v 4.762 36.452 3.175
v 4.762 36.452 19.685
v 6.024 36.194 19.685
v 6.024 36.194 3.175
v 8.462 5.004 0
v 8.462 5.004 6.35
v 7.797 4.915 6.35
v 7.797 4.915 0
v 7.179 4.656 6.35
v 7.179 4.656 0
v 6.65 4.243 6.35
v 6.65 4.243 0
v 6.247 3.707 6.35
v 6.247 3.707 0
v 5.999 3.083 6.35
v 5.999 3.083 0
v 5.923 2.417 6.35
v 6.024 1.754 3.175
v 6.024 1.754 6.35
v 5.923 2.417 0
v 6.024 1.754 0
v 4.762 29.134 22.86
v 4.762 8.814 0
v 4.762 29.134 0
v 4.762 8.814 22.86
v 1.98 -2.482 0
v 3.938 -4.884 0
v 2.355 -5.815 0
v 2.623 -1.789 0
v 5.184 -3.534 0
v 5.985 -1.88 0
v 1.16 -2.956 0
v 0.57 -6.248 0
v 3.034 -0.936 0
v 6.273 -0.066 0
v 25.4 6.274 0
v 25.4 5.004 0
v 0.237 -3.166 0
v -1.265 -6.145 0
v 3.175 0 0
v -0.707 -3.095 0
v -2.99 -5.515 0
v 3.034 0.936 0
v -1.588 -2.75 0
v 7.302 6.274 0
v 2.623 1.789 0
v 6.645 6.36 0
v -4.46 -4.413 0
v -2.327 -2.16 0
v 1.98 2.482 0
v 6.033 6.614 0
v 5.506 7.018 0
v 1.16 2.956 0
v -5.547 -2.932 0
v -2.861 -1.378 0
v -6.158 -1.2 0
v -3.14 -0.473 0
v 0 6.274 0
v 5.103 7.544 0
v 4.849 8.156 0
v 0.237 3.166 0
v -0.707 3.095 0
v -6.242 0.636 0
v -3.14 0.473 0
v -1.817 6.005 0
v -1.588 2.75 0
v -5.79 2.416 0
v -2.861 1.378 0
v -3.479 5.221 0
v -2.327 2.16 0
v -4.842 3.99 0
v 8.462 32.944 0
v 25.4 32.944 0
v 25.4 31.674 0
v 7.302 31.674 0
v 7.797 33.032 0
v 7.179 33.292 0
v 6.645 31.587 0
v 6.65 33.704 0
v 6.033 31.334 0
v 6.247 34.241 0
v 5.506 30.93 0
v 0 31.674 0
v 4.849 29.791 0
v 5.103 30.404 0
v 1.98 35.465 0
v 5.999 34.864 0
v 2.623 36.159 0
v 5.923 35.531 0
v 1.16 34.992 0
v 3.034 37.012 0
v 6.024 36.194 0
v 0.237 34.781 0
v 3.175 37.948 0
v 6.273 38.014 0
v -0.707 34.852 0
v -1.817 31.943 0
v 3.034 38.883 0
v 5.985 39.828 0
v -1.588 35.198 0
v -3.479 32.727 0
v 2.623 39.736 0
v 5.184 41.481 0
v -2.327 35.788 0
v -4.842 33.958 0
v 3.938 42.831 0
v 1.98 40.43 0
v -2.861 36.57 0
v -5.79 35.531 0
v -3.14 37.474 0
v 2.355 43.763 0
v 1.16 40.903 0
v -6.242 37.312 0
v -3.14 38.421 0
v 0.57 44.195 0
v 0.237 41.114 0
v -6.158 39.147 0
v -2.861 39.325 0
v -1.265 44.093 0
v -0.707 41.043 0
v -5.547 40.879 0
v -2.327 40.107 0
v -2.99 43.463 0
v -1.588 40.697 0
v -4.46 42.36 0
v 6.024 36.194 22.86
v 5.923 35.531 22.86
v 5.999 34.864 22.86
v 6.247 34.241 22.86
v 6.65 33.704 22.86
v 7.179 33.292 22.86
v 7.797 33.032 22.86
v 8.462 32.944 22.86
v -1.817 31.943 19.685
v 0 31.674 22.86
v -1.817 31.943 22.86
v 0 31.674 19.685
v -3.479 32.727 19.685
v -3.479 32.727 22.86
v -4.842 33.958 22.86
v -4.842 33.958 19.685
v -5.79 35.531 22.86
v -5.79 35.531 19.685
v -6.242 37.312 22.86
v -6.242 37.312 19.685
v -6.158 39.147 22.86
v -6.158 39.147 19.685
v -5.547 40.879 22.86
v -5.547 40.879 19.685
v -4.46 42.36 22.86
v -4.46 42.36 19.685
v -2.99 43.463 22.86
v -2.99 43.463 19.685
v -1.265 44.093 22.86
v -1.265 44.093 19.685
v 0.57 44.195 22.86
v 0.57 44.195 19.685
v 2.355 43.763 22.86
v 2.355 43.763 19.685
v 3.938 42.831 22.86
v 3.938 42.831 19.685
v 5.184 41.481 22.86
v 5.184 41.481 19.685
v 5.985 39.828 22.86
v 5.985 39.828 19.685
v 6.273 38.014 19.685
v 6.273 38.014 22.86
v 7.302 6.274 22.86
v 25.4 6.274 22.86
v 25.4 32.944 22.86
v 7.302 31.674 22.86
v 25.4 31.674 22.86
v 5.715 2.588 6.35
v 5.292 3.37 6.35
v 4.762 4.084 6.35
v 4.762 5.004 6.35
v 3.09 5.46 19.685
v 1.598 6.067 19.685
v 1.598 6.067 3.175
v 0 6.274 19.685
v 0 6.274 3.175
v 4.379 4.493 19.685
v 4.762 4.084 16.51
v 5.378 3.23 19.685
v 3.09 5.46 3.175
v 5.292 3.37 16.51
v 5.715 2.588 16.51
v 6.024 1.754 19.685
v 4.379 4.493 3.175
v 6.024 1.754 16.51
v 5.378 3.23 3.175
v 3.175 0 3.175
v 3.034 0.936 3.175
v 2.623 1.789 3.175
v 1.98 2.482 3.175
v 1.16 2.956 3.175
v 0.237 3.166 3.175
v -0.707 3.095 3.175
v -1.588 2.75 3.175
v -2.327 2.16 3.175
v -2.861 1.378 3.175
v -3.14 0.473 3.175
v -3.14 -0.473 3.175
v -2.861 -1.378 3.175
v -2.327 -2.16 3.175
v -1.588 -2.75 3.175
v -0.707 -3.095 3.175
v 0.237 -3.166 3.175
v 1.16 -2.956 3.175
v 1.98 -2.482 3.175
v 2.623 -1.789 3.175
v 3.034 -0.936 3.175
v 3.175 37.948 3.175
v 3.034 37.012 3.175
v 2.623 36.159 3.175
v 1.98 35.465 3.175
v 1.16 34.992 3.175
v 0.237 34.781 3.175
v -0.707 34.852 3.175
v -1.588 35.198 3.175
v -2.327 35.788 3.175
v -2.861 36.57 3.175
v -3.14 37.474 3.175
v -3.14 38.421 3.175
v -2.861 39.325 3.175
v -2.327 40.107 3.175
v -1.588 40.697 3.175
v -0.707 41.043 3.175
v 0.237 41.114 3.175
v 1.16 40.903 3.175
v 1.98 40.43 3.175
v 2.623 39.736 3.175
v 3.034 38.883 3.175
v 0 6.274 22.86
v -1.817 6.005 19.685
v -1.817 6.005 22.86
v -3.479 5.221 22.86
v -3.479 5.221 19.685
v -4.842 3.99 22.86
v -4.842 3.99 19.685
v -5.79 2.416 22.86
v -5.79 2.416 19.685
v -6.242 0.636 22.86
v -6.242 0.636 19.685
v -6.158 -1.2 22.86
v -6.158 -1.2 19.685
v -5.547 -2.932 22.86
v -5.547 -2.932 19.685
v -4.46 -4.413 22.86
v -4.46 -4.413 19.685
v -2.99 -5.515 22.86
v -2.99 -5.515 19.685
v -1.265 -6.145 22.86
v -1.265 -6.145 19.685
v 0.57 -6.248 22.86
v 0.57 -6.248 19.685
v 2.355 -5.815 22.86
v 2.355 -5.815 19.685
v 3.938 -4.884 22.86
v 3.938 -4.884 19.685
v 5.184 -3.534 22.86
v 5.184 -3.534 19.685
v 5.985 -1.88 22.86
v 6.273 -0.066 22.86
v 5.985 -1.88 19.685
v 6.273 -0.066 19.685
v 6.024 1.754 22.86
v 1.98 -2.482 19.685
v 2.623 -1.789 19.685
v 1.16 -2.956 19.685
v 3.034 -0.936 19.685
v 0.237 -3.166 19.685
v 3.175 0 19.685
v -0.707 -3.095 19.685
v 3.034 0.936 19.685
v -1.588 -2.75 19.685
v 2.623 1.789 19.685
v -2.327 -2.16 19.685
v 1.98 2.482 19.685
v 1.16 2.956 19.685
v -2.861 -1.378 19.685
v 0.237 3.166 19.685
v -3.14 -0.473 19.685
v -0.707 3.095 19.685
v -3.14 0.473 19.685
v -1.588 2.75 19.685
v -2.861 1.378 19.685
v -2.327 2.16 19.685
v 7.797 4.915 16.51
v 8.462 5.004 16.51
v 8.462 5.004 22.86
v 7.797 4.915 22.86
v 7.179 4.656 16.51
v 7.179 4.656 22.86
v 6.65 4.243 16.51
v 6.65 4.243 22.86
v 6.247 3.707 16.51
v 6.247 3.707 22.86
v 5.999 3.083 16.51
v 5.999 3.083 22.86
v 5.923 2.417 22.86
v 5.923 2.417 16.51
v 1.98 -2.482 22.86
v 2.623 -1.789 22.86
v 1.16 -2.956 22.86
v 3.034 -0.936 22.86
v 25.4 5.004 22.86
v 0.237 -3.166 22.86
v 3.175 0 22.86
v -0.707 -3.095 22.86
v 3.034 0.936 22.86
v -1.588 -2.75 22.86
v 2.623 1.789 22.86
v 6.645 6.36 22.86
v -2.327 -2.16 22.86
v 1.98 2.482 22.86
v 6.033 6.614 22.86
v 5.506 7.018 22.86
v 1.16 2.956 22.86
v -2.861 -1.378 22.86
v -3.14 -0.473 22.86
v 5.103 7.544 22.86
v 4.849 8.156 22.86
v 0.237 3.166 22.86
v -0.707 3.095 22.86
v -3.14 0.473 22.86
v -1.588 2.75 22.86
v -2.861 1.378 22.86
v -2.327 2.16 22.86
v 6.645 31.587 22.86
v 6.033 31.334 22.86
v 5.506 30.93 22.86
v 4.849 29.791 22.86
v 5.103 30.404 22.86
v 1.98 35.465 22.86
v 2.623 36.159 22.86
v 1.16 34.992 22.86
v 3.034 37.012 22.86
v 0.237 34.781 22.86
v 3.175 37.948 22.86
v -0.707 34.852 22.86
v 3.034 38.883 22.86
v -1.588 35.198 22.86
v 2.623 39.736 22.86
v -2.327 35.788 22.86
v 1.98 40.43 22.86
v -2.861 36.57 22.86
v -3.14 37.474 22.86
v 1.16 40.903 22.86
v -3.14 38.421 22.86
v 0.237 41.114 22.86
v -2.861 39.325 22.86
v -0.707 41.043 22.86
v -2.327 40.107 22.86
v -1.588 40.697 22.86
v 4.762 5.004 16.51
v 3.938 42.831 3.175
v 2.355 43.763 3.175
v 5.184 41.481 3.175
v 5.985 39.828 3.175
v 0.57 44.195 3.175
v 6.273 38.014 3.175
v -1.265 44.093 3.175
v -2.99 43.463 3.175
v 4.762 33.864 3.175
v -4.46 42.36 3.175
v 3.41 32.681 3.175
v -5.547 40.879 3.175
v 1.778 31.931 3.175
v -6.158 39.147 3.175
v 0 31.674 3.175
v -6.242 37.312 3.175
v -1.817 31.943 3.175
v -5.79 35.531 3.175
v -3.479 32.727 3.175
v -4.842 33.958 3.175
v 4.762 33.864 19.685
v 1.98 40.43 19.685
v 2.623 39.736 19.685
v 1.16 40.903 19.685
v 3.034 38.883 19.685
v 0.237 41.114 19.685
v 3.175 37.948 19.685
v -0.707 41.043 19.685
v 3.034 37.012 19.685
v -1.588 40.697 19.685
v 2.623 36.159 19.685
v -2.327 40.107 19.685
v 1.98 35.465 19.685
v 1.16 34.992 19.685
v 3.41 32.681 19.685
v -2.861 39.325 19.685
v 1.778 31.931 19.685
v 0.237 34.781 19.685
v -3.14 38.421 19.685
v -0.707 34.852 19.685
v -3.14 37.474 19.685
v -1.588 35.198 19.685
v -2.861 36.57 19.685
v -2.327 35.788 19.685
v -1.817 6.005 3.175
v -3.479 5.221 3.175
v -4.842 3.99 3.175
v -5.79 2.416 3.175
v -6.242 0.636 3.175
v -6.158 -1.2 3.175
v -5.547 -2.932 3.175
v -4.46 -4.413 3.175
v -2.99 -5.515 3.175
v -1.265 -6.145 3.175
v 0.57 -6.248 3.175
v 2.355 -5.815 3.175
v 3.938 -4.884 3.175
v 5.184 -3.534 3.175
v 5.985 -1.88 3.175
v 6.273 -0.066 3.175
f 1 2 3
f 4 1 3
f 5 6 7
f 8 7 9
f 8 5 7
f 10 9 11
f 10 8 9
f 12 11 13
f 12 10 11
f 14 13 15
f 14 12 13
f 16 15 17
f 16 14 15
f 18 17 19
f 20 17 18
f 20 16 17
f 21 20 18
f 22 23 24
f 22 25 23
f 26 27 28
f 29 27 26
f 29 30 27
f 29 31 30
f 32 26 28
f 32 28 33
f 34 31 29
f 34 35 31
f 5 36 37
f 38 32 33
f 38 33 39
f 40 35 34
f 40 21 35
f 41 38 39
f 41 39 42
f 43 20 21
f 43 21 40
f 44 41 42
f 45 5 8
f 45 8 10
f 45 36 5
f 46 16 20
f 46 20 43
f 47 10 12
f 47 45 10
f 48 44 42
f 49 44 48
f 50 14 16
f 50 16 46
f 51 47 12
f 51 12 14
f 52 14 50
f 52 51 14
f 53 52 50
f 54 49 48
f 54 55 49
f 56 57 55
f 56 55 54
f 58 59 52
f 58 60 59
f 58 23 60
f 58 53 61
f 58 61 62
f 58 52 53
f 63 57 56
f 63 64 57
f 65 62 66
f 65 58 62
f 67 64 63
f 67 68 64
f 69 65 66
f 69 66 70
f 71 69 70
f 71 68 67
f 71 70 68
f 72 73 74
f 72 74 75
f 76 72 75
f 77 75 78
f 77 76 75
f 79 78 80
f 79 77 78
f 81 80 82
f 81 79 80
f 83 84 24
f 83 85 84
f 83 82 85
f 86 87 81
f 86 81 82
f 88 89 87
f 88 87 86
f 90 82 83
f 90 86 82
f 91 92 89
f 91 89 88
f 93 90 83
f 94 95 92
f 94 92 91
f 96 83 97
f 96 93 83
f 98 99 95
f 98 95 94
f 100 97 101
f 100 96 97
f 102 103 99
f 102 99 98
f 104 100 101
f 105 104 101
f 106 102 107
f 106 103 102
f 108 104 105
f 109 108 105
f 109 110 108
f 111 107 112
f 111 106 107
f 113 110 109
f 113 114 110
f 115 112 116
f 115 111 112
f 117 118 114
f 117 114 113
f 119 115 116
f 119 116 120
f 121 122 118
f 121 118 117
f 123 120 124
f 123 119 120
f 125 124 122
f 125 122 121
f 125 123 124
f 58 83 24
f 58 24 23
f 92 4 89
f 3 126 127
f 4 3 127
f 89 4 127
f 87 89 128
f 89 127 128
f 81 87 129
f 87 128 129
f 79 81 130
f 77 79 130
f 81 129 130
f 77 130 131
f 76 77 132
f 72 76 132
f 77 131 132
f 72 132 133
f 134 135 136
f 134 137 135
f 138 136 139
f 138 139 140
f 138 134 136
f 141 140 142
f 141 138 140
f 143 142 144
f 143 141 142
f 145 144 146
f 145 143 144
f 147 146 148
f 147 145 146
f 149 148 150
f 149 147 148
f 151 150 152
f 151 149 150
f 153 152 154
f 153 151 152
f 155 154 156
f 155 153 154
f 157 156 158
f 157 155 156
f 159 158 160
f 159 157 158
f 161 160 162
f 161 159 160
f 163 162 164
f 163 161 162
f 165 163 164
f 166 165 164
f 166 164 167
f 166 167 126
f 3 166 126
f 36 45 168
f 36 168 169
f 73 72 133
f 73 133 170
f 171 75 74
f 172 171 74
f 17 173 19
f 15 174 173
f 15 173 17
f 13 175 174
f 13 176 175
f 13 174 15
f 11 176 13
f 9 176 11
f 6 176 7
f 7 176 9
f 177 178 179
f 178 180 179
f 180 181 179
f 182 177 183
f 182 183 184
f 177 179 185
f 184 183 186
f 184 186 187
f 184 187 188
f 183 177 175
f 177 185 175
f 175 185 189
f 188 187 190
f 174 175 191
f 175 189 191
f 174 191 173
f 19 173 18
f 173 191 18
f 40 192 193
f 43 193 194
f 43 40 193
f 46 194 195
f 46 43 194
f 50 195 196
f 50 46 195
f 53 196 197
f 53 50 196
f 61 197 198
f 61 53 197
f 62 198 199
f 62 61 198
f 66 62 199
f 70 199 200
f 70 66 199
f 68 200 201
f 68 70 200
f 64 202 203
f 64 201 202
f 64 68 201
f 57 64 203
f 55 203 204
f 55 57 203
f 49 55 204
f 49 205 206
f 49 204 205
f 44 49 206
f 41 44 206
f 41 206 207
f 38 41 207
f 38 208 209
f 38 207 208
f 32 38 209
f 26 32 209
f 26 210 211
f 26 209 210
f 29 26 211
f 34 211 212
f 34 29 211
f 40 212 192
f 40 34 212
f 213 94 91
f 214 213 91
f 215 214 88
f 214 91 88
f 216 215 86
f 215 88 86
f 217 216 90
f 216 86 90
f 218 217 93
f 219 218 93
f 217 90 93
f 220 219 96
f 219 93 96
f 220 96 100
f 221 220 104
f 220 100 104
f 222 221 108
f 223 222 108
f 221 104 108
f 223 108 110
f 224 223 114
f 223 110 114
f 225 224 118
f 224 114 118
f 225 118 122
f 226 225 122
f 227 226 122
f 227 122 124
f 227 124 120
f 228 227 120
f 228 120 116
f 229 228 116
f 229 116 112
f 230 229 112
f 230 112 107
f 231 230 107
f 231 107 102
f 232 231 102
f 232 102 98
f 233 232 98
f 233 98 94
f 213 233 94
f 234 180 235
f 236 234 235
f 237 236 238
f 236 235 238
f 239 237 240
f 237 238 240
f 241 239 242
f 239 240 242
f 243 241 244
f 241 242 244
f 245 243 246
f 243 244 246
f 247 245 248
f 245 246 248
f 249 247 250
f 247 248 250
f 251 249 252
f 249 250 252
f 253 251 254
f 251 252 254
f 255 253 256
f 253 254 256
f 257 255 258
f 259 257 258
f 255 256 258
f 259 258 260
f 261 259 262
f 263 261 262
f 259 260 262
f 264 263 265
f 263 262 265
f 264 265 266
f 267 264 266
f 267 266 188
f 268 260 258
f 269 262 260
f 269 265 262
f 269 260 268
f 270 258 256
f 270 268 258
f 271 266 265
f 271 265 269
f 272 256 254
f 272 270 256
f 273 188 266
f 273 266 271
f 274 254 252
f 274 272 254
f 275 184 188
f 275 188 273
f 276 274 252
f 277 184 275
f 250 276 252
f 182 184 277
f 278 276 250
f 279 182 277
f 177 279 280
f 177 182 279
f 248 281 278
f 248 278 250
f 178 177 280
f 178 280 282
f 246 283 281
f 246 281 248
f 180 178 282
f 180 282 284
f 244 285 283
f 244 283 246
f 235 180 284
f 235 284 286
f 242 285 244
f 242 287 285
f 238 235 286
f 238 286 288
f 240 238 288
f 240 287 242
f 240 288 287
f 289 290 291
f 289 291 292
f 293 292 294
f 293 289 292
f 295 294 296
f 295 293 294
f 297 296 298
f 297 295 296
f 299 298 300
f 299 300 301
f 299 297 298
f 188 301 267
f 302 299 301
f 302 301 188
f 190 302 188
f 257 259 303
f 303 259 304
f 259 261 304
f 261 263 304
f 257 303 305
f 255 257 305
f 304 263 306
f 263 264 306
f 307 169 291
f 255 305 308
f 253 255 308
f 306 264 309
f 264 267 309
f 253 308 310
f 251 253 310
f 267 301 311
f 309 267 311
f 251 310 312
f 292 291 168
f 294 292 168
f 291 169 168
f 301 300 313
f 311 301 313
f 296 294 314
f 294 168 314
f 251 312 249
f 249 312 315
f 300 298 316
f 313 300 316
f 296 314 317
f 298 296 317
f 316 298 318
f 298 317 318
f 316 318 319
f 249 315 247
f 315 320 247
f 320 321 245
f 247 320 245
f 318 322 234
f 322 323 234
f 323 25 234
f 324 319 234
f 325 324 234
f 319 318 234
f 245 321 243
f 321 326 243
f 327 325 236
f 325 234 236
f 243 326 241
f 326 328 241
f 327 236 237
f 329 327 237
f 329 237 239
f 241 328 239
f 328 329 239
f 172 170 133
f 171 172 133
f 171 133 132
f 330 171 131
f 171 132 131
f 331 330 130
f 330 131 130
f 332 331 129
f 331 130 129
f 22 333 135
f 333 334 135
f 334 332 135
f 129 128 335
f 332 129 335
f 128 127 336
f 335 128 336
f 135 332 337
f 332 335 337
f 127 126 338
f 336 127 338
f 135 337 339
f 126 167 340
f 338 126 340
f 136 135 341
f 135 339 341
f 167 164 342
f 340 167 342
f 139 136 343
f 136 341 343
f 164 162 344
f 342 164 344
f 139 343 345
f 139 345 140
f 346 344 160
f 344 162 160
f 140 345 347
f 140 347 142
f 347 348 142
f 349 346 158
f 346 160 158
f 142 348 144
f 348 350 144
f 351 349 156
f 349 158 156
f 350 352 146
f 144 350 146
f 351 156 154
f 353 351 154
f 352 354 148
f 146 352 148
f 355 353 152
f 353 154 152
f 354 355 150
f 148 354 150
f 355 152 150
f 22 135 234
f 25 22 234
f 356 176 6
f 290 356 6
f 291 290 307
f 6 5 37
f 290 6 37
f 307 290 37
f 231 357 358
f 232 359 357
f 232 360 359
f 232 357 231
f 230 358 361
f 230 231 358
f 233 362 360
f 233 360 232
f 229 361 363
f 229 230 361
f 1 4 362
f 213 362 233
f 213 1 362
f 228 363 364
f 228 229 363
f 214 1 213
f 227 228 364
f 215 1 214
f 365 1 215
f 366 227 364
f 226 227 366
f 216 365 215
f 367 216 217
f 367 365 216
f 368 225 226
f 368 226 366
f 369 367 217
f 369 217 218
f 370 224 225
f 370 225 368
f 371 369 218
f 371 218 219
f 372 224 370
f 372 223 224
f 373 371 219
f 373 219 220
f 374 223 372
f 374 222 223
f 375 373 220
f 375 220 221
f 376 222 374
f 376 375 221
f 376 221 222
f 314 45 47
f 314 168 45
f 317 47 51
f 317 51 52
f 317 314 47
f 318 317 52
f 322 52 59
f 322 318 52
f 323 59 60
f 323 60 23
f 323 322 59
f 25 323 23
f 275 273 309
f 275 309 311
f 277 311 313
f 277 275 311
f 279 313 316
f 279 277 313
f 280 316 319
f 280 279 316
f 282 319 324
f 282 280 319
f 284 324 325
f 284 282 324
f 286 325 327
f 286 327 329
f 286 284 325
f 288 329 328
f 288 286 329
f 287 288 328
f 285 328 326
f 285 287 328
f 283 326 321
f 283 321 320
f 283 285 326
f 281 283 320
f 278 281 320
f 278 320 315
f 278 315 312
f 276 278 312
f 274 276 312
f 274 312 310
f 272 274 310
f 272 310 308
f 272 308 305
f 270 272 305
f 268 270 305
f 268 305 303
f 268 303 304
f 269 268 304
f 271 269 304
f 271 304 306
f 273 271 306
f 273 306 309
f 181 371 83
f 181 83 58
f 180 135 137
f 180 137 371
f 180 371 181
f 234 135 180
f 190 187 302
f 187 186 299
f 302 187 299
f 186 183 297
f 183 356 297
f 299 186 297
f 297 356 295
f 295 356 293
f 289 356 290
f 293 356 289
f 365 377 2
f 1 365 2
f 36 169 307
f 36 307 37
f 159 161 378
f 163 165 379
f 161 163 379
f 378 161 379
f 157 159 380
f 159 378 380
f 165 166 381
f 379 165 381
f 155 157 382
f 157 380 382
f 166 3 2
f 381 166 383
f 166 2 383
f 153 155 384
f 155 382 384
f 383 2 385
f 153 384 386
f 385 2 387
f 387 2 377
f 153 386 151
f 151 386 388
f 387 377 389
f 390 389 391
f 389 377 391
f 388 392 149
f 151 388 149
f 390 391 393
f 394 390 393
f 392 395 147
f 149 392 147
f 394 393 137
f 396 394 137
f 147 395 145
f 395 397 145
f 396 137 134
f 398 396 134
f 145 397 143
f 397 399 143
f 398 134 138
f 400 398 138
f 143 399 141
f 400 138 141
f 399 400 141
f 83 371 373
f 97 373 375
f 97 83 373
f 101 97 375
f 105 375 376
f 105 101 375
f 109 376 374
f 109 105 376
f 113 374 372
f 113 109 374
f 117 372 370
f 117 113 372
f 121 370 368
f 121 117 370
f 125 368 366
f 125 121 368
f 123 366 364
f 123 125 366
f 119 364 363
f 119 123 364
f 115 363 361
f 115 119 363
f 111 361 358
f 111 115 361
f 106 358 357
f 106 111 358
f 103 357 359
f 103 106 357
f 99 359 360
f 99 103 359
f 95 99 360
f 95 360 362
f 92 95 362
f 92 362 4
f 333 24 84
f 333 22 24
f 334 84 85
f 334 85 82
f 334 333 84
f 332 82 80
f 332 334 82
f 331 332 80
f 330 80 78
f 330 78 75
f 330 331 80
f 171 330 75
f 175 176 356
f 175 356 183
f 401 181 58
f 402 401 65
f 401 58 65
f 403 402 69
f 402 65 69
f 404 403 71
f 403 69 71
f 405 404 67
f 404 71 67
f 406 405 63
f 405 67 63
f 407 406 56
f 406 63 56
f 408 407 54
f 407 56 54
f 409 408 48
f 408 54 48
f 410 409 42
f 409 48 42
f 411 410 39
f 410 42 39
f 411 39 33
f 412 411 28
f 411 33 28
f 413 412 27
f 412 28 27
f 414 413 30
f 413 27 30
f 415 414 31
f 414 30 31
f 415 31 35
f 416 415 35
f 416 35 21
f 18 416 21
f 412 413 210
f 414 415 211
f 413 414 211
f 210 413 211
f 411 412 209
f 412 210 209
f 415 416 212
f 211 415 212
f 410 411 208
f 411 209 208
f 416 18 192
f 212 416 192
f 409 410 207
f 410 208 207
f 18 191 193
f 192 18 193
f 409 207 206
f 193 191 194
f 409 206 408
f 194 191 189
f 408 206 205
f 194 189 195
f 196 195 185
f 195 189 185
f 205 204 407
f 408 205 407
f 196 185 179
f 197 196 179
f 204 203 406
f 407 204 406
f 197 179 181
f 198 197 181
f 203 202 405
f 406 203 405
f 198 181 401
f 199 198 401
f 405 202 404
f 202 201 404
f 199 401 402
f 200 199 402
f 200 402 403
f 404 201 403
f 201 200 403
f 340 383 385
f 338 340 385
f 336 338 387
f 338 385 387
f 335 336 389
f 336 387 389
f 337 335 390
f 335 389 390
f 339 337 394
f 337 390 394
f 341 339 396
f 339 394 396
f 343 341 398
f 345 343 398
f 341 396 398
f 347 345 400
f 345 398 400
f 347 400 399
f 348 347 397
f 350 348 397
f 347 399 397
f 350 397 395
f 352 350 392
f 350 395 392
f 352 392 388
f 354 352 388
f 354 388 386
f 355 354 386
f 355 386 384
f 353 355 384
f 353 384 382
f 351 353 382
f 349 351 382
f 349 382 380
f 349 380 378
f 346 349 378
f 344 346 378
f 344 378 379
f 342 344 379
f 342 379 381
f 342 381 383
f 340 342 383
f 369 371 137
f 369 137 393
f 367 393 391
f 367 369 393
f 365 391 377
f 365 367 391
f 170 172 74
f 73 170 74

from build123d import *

# Parameters (mm, degrees)
SKETCH1_R           = 6.2738
SKETCH1_R_2         = 3.175
BOSS_EXTRUDE1_DEPTH = 22.86
SKETCH2_W           = 25.4
SKETCH2_H           = 22.86
BOSS_EXTRUDE2_DEPTH = 1.27
FILLET1_R           = 2.54
SKETCH3_R           = 6.2738
CUT_EXTRUDE1_DEPTH  = 16.51
CUT_EXTRUDE5_START  = 3.175
CUT_EXTRUDE5_DEPTH  = 10.16
BOSS_EXTRUDE4_DEPTH = 22.86
FILLET2_R           = 2.54
FILLET3_R           = 2.54
BOSS_EXTRUDE5_DEPTH = 22.86


with BuildPart() as part:
    # Sketch1 → Boss-Extrude1 (new body)
    with BuildSketch(Plane.XY):
        Circle(SKETCH1_R)
        Circle(SKETCH1_R_2, mode=Mode.SUBTRACT)
    boss_extrude1 = extrude(amount=BOSS_EXTRUDE1_DEPTH)

    # Sketch2 → Boss-Extrude2 (add)
    with BuildSketch(Plane(origin=(0, 6.2738, 0), x_dir=(1, 0, 0), z_dir=(0, 1, 0))):
        with Locations((12.7, -11.43)):
            Rectangle(SKETCH2_W, SKETCH2_H)
    boss_extrude2 = extrude(amount=-BOSS_EXTRUDE2_DEPTH)

    # Fillet1
    fillet1_edges = [part.edges().sort_by_distance(p)[0] for p in [
        (3.784514764, 5.0038, 11.43),
    ]]
    fillet(fillet1_edges, radius=FILLET1_R)

    # Sketch3 → Cut-Extrude1 (cut)
    with BuildSketch(Plane(origin=(0, 0, 3.175), x_dir=(-1, 0, 0), z_dir=(0, 0, -1))):
        Circle(SKETCH3_R)
    cut_extrude1 = extrude(amount=-CUT_EXTRUDE1_DEPTH, mode=Mode.SUBTRACT)

    # Sketch9 → Cut-Extrude5 (cut)
    with BuildSketch(Plane(origin=(0, 0, 19.685), x_dir=(-1, 0, 0), z_dir=(0, 0, -1)).offset(CUT_EXTRUDE5_START)):
        with BuildLine():
            Line((-6.2738, 0), (-8.462432274, 5.0038))
            Line((-8.462432274, 5.0038), (-3.784514764, 5.0038))
            ThreePointArc((-3.784514764, 5.0038), (5.617110252, -2.794394184), (-6.2738, 0))
        make_face()
    extrude(amount=CUT_EXTRUDE5_DEPTH, mode=Mode.SUBTRACT)

    # Sketch10 → Boss-Extrude4 (add)
    with BuildSketch(Plane.XY.offset(22.86)):
        with BuildLine():
            Line((0, 6.2738), (0, 19.05))
            Line((0, 19.05), (4.7625, 19.05))
            Line((4.7625, 19.05), (4.7625, 4.084012756))
            ThreePointArc((4.7625, 4.084012756), (2.620905112, 5.700124809), (0, 6.2738))
        make_face()
    boss_extrude4 = extrude(amount=-BOSS_EXTRUDE4_DEPTH)

    # Fillet2
    fillet2_edges = [part.edges().sort_by_distance(p)[0] for p in [
        (4.7625, 6.2738, 11.43),
    ]]
    fillet(fillet2_edges, radius=FILLET2_R)

    # Mirror5: Boss-Extrude4 across plane
    add(boss_extrude4.mirror(Plane(origin=(4.7625, 19.05, -15.705482496), x_dir=(0, 0, 1), z_dir=(0, 1, 0))))

    # Mirror7: Boss-Extrude1 across plane
    add(boss_extrude1.mirror(Plane.ZX.offset(18.9738)))

    # Mirror9: Boss-Extrude2 across plane
    add(boss_extrude2.mirror(Plane.ZX.offset(18.9738)))

    # Mirror11: Cut-Extrude1 across plane
    add(cut_extrude1.mirror(Plane.ZX.offset(18.9738)), mode=Mode.SUBTRACT)

    # Fillet3
    fillet3_edges = [part.edges().sort_by_distance(p)[0] for p in [
        (4.7625, 31.6738, 11.43),
    ]]
    fillet(fillet3_edges, radius=FILLET3_R)

    # Sketch12 → Boss-Extrude5 (add)
    with BuildSketch(Plane.XY.offset(22.86)):
        with BuildLine():
            Line((8.462432274, 32.9438), (4.7625, 32.9438))
            Line((4.7625, 32.9438), (4.7625, 36.451836926))
            Line((4.7625, 36.451836926), (6.023690985, 36.193828818))
            ThreePointArc((6.023690985, 36.193828818), (6.430798302, 33.959312086), (8.462432274, 32.9438))
        make_face()
    extrude(amount=-BOSS_EXTRUDE5_DEPTH)


solid = part.part
